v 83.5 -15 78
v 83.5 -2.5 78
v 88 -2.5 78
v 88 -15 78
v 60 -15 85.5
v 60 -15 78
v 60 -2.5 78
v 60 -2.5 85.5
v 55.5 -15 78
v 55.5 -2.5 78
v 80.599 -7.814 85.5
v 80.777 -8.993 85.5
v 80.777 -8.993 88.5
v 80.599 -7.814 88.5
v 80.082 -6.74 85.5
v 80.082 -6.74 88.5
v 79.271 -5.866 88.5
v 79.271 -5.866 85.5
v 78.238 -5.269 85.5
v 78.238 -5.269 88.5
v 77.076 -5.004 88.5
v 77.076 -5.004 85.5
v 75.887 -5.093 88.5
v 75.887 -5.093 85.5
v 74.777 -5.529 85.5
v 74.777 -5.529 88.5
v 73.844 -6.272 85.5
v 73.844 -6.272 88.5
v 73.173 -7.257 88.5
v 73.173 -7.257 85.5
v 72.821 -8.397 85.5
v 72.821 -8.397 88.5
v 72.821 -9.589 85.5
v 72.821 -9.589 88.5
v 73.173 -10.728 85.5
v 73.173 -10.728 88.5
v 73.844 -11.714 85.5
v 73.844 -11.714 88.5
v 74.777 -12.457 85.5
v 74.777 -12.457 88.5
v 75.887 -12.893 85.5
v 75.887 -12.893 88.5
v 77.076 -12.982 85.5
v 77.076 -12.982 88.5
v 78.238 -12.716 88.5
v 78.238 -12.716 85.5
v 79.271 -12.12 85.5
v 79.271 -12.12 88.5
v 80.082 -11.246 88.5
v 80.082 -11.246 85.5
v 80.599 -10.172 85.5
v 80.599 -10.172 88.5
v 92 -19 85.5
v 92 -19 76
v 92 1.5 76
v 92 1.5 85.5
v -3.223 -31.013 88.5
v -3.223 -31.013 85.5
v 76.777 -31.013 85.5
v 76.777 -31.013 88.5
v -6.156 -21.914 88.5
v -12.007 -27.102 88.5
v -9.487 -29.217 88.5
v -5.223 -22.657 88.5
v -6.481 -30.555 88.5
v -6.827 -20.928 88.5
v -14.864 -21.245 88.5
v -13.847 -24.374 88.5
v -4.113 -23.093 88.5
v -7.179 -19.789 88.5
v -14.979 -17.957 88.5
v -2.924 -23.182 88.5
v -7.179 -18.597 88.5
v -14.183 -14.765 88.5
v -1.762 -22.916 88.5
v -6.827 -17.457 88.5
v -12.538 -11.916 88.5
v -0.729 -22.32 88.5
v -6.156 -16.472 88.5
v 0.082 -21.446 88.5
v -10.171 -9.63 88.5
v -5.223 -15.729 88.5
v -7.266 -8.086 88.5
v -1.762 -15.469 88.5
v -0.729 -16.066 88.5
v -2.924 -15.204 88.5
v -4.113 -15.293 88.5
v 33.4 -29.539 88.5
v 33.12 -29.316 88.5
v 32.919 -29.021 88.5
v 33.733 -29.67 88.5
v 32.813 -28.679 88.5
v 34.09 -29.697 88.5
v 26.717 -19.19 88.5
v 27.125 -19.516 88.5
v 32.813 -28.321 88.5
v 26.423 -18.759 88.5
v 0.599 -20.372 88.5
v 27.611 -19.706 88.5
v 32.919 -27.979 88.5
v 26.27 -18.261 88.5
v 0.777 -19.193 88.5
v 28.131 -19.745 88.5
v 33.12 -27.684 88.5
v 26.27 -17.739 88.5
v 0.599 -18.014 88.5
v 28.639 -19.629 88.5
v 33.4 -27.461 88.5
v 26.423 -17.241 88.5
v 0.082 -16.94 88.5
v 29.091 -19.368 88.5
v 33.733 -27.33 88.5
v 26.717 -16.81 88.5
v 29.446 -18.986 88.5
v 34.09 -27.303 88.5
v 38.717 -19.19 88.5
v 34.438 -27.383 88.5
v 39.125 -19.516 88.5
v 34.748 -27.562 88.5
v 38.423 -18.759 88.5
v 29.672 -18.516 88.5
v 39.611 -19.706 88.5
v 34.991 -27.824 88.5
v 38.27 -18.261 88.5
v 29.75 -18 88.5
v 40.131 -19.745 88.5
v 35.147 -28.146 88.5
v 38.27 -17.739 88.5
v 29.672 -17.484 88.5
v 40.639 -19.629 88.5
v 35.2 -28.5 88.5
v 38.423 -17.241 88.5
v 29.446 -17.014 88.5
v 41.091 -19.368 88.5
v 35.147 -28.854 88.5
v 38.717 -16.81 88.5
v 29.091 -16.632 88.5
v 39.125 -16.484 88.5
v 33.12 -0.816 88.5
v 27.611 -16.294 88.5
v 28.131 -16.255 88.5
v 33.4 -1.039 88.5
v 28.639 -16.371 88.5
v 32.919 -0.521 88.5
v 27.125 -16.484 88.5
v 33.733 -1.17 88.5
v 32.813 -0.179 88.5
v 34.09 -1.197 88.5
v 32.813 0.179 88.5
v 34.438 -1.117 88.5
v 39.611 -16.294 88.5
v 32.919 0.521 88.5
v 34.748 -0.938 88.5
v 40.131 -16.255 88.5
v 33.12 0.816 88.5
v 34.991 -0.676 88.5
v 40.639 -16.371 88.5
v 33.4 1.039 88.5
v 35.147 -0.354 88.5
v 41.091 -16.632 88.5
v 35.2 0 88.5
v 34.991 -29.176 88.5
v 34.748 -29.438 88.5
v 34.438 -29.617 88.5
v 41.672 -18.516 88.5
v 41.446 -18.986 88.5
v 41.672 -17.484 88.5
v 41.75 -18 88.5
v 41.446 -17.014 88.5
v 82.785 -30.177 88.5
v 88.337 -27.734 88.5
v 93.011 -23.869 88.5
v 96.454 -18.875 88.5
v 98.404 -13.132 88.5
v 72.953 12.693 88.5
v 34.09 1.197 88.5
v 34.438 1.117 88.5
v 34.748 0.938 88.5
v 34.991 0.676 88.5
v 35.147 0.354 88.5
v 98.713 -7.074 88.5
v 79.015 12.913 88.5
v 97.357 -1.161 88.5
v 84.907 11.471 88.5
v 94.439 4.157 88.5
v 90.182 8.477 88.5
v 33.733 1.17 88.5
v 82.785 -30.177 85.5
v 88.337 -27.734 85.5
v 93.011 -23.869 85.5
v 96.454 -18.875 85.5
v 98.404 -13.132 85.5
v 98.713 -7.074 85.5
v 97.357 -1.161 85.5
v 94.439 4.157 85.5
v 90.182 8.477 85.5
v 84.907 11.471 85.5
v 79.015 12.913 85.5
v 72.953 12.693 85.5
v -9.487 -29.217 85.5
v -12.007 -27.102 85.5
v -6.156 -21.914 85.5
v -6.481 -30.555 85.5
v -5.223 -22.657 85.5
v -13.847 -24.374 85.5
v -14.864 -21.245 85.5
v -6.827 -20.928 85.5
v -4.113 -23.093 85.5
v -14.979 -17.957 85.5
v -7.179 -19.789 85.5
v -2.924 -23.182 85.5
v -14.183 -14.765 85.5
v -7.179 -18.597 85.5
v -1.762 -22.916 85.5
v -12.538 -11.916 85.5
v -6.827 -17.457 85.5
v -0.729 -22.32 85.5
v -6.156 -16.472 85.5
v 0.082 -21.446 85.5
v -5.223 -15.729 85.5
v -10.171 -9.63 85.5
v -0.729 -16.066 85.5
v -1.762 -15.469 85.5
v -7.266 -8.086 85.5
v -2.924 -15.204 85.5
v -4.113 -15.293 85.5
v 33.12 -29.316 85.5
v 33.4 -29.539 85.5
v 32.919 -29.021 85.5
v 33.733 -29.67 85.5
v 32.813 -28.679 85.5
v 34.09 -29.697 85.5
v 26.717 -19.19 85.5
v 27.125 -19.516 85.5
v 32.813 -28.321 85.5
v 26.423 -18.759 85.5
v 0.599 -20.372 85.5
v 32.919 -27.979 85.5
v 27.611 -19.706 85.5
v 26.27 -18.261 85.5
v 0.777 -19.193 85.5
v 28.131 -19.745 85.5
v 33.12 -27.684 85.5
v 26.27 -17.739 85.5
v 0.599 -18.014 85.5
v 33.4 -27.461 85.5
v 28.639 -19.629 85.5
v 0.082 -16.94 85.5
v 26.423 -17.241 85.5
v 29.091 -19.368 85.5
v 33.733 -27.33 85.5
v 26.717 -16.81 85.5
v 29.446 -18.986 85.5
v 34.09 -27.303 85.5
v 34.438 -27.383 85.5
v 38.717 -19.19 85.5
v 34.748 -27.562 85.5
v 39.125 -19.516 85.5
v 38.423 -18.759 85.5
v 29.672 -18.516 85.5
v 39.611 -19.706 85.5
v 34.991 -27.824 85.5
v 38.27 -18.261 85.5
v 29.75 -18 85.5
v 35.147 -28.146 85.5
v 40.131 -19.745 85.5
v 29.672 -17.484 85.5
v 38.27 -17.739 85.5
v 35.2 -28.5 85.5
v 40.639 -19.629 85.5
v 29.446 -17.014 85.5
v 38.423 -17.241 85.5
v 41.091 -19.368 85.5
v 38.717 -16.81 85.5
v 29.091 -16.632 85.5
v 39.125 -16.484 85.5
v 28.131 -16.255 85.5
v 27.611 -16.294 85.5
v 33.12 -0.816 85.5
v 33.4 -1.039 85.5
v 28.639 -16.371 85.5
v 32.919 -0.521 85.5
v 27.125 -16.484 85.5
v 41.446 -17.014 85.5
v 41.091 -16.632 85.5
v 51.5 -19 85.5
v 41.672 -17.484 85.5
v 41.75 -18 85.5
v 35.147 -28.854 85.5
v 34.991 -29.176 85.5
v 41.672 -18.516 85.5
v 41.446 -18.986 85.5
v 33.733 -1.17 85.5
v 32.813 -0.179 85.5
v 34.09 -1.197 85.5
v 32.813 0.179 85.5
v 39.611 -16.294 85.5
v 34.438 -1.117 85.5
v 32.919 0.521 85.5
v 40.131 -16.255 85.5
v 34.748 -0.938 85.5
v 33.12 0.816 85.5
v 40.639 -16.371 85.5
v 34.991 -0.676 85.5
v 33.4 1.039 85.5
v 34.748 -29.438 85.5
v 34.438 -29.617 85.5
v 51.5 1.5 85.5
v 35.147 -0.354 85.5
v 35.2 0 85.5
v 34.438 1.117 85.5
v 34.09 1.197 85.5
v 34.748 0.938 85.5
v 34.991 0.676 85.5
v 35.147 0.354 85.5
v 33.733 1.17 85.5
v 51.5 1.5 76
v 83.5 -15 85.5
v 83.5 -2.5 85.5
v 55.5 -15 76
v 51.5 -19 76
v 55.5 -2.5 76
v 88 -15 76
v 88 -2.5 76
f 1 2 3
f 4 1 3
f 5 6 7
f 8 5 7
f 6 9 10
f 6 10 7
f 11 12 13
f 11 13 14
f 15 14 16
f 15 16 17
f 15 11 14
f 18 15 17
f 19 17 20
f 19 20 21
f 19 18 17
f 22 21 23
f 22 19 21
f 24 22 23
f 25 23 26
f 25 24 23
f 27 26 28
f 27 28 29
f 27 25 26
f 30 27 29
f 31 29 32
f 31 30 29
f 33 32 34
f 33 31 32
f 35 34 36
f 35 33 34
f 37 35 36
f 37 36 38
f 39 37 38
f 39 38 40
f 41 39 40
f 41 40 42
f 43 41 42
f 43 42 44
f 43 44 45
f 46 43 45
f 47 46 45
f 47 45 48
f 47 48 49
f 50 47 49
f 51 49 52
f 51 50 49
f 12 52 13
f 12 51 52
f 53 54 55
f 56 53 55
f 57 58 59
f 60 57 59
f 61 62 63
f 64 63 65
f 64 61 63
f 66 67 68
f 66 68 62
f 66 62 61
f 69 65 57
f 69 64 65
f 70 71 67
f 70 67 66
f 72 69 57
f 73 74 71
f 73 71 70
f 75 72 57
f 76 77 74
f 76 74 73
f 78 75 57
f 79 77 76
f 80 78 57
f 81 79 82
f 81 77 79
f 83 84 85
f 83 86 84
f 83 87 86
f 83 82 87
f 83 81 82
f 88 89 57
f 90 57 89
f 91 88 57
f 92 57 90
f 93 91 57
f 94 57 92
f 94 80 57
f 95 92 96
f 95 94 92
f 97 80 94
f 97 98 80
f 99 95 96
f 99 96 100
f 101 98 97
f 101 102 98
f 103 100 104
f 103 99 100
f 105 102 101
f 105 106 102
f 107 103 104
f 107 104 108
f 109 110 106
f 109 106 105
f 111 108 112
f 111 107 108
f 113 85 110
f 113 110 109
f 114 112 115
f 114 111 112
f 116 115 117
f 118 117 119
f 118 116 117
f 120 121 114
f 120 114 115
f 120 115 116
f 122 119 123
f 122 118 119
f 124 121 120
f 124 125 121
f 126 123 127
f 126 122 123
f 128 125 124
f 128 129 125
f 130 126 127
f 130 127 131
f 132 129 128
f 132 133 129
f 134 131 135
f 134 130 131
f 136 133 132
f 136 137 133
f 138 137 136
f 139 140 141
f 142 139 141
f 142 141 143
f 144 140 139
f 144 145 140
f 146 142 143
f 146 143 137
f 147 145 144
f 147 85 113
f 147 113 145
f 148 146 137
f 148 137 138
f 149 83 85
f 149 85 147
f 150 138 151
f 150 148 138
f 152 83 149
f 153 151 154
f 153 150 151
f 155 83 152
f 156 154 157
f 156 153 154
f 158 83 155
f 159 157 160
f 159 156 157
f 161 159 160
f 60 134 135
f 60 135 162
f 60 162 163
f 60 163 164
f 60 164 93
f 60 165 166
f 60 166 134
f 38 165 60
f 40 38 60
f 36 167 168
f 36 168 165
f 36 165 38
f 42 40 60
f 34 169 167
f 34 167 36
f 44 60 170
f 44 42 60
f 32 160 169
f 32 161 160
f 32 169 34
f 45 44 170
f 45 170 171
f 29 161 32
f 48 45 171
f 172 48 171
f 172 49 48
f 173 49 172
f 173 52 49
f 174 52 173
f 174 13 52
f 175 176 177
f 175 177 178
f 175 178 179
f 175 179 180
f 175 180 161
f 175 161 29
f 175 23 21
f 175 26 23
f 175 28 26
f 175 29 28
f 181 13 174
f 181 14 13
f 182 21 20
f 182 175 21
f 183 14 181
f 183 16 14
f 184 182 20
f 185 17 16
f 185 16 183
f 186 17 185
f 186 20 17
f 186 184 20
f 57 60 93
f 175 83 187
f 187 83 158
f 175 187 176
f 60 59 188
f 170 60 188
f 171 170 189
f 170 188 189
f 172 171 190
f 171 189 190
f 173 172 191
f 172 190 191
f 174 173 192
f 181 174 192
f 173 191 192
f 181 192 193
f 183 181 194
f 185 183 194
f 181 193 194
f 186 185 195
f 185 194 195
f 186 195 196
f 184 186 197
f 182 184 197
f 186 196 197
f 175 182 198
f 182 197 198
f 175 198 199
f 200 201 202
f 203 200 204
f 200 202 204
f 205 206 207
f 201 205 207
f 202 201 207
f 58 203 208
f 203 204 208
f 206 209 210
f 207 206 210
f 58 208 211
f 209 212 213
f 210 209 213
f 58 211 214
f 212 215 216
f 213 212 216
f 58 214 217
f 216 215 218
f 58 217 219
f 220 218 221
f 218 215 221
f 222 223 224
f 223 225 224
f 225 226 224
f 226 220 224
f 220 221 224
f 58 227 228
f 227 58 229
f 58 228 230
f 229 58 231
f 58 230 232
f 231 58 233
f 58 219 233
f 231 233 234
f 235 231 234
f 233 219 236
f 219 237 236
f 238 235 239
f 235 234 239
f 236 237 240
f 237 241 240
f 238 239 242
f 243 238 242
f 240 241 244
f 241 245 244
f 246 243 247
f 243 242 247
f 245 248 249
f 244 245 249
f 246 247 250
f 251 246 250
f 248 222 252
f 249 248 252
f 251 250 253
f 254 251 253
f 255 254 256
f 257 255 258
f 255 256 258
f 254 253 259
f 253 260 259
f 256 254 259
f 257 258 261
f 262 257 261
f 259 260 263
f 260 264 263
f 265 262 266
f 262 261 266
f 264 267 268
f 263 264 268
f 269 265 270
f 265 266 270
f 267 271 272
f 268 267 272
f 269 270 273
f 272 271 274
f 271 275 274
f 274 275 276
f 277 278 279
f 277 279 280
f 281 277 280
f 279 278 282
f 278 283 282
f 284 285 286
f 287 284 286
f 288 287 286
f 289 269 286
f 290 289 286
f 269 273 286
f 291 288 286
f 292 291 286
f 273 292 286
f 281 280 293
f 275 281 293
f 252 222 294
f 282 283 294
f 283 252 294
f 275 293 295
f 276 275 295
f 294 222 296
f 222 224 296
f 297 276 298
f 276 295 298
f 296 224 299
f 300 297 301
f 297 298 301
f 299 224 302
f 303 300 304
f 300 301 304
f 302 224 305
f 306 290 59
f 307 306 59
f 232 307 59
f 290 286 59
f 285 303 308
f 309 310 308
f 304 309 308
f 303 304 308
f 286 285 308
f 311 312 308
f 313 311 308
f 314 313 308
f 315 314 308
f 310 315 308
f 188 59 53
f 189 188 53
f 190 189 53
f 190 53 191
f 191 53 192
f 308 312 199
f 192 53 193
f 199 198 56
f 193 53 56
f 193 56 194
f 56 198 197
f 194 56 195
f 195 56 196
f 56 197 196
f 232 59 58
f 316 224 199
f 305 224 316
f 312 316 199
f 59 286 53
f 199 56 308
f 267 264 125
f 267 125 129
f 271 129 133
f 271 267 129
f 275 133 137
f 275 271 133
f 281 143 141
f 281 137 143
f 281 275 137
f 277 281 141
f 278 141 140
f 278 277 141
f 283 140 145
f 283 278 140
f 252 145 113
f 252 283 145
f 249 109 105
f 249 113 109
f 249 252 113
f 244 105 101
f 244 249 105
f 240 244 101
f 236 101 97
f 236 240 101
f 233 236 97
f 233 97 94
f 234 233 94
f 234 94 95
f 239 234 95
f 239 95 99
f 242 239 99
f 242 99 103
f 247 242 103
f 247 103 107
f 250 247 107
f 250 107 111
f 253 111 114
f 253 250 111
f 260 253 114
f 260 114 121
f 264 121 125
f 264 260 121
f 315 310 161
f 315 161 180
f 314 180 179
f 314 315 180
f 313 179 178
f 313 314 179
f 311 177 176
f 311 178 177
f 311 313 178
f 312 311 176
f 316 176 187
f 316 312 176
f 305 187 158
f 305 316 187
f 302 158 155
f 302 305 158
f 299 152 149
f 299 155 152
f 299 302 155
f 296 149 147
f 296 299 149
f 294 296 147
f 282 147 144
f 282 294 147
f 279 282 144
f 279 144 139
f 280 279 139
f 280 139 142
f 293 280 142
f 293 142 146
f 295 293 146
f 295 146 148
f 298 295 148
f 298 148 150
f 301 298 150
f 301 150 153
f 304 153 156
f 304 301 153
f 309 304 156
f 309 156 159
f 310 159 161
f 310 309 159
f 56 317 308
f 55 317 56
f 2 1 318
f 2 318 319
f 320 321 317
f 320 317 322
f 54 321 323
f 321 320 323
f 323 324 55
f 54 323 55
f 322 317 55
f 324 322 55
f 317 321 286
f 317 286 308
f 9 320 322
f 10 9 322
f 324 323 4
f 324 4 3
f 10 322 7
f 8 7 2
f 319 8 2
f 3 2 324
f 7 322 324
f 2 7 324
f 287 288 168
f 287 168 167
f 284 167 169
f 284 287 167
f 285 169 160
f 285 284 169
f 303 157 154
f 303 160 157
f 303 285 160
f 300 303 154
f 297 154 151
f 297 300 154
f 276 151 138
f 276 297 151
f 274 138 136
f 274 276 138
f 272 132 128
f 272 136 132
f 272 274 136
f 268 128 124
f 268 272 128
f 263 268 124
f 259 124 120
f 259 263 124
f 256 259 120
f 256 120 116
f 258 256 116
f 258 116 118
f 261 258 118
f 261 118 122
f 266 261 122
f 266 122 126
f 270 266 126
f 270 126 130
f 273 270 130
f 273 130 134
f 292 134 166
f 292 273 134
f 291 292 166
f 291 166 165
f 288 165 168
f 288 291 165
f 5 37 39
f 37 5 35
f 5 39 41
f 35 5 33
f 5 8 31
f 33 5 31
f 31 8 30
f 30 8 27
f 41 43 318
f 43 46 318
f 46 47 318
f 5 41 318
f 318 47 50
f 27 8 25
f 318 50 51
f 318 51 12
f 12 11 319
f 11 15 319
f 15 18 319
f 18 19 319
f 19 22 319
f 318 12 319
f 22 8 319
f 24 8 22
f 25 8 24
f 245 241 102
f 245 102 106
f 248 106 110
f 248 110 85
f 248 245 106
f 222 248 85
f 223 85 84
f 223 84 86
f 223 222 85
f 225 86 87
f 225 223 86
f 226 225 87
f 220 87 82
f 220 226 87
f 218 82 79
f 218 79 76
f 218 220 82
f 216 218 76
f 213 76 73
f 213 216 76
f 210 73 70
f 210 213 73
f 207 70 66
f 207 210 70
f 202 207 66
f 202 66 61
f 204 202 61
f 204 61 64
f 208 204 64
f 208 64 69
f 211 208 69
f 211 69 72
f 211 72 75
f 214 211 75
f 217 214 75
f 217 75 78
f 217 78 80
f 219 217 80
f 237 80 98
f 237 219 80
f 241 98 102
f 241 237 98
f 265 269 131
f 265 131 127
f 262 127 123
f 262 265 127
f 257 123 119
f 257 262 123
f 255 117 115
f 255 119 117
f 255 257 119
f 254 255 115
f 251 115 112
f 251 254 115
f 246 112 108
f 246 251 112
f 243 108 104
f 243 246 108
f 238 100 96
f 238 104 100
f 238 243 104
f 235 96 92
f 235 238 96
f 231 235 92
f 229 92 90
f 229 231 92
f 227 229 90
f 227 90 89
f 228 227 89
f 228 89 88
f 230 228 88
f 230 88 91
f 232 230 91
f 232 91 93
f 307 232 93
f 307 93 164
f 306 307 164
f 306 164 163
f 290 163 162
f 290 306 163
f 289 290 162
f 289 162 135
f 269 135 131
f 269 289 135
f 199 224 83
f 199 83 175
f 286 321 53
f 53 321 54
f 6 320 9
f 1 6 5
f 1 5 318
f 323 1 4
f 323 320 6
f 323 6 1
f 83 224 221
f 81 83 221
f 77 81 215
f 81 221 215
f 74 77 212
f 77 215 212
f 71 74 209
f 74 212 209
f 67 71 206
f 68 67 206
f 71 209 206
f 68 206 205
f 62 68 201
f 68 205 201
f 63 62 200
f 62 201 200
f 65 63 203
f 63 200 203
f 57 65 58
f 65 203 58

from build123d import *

# Parameters (mm, degrees)
CYLINDER026_R     = 1.75
CYLINDER026_DEPTH = 20
CYLINDER025_R     = 1.75
CYLINDER025_DEPTH = 20
CYLINDER014_R     = 1.2
CYLINDER014_DEPTH = 10
CYLINDER013_R     = 1.2
CYLINDER013_DEPTH = 10
SKETCH_R          = 4
PAD_DEPTH         = 3
BOX008_W          = 23.5
BOX008_H          = 12.5
BOX008_DEPTH      = 10
BOX007_W          = 32.5
BOX007_H          = 12.5
BOX007_DEPTH      = 2
BOX006_W          = 40.5
BOX006_H          = 20.5
BOX006_DEPTH      = 9.5


with BuildPart() as cylinder061:
    # Cylinder026 → Cylinder026 (new body)
    with BuildSketch(Plane(origin=(40, -18, 77), x_dir=(1, 0, 0), z_dir=(0, 0, 1))):
        Circle(CYLINDER026_R)
    extrude(amount=CYLINDER026_DEPTH)


with BuildPart() as cylinder060:
    # Cylinder025 → Cylinder025 (new body)
    with BuildSketch(Plane(origin=(28, -18, 77), x_dir=(1, 0, 0), z_dir=(0, 0, 1))):
        Circle(CYLINDER025_R)
    extrude(amount=CYLINDER025_DEPTH)


with BuildPart() as cylinder049:
    # Cylinder014 → Cylinder014 (new body)
    with BuildSketch(Plane(origin=(55, 19, -5), x_dir=(1, 0, 0), z_dir=(0, 0, 1))):
        Circle(CYLINDER014_R)
    extrude(amount=CYLINDER014_DEPTH)


with BuildPart() as cylinder048:
    # Cylinder013 → Cylinder013 (new body)
    with BuildSketch(Plane(origin=(55, -9.5, -5), x_dir=(1, 0, 0), z_dir=(0, 0, 1))):
        Circle(CYLINDER013_R)
    extrude(amount=CYLINDER013_DEPTH)


with BuildPart() as tapa:
    # Sketch → Pad (new body)
    with BuildSketch(Plane.XY.offset(-3)):
        with BuildLine():
            ThreePointArc((13.733879, 10.914307), (6.136168, -2.245404), (17.776624, -12.012848))
            Line((17.776624, -12.012848), (97.776624, -12.012848))
            ThreePointArc((97.776624, -12.012848), (119.712869, 11.926287), (93.95296, 31.692625))
            Line((13.733879, 10.914307), (93.95296, 31.692625))
        make_face()
        with Locations((17.77659, -0.192848)):
            Circle(SKETCH_R, mode=Mode.SUBTRACT)
        with Locations((97.776659, 10.007152)):
            Circle(SKETCH_R, mode=Mode.SUBTRACT)
    extrude(amount=PAD_DEPTH)


with BuildPart() as cube008:
    # Box008 → Box008 (new body)
    with BuildSketch(Plane(origin=(8.5, 4, 0), x_dir=(1, 0, 0), z_dir=(0, 0, 1))):
        with Locations((11.75, 6.25)):
            Rectangle(BOX008_W, BOX008_H)
    extrude(amount=BOX008_DEPTH)


with BuildPart() as cube007:
    # Box007 → Box007 (new body)
    with BuildSketch(Plane(origin=(4, 4, 0), x_dir=(1, 0, 0), z_dir=(0, 0, 1))):
        with Locations((16.25, 6.25)):
            Rectangle(BOX007_W, BOX007_H)
    extrude(amount=BOX007_DEPTH)


with BuildPart() as tapa_izquierda_interior:
    # Box006 → Box006 (new body)
    with BuildSketch(Plane.XY):
        with Locations((20.25, 10.25)):
            Rectangle(BOX006_W, BOX006_H)
    extrude(amount=BOX006_DEPTH)

    # Cut008: cut Cube007
    add(cube007.part, mode=Mode.SUBTRACT)

    # Cut009: cut Cube008
    add(cube008.part, mode=Mode.SUBTRACT)


with BuildPart() as tapa_izquierda_interior_1:
    # Cut009 placement: moved
    add(tapa_izquierda_interior.part.moved(Location((72.5, 0, -12.5))))

    # Fusion006: union Tapa
    add(tapa.part)


with BuildPart() as tapa_izquierda_interior_2:
    # Fusion006 placement: moved
    add(tapa_izquierda_interior_1.part.moved(Location((0, 0, -0.5))))

    # Cut013: cut Cylinder048
    add(cylinder048.part, mode=Mode.SUBTRACT)

    # Cut014: cut Cylinder049
    add(cylinder049.part, mode=Mode.SUBTRACT)


with BuildPart() as tapa_izquierda_interior_3:
    # Cut014 placement: moved
    add(tapa_izquierda_interior_2.part.moved(Location((-21, -19, 89))))

    # Cut049: cut Cylinder060
    add(cylinder060.part, mode=Mode.SUBTRACT)

    # Cut050: cut Cylinder061
    add(cylinder061.part, mode=Mode.SUBTRACT)


solid = tapa_izquierda_interior_3.part
